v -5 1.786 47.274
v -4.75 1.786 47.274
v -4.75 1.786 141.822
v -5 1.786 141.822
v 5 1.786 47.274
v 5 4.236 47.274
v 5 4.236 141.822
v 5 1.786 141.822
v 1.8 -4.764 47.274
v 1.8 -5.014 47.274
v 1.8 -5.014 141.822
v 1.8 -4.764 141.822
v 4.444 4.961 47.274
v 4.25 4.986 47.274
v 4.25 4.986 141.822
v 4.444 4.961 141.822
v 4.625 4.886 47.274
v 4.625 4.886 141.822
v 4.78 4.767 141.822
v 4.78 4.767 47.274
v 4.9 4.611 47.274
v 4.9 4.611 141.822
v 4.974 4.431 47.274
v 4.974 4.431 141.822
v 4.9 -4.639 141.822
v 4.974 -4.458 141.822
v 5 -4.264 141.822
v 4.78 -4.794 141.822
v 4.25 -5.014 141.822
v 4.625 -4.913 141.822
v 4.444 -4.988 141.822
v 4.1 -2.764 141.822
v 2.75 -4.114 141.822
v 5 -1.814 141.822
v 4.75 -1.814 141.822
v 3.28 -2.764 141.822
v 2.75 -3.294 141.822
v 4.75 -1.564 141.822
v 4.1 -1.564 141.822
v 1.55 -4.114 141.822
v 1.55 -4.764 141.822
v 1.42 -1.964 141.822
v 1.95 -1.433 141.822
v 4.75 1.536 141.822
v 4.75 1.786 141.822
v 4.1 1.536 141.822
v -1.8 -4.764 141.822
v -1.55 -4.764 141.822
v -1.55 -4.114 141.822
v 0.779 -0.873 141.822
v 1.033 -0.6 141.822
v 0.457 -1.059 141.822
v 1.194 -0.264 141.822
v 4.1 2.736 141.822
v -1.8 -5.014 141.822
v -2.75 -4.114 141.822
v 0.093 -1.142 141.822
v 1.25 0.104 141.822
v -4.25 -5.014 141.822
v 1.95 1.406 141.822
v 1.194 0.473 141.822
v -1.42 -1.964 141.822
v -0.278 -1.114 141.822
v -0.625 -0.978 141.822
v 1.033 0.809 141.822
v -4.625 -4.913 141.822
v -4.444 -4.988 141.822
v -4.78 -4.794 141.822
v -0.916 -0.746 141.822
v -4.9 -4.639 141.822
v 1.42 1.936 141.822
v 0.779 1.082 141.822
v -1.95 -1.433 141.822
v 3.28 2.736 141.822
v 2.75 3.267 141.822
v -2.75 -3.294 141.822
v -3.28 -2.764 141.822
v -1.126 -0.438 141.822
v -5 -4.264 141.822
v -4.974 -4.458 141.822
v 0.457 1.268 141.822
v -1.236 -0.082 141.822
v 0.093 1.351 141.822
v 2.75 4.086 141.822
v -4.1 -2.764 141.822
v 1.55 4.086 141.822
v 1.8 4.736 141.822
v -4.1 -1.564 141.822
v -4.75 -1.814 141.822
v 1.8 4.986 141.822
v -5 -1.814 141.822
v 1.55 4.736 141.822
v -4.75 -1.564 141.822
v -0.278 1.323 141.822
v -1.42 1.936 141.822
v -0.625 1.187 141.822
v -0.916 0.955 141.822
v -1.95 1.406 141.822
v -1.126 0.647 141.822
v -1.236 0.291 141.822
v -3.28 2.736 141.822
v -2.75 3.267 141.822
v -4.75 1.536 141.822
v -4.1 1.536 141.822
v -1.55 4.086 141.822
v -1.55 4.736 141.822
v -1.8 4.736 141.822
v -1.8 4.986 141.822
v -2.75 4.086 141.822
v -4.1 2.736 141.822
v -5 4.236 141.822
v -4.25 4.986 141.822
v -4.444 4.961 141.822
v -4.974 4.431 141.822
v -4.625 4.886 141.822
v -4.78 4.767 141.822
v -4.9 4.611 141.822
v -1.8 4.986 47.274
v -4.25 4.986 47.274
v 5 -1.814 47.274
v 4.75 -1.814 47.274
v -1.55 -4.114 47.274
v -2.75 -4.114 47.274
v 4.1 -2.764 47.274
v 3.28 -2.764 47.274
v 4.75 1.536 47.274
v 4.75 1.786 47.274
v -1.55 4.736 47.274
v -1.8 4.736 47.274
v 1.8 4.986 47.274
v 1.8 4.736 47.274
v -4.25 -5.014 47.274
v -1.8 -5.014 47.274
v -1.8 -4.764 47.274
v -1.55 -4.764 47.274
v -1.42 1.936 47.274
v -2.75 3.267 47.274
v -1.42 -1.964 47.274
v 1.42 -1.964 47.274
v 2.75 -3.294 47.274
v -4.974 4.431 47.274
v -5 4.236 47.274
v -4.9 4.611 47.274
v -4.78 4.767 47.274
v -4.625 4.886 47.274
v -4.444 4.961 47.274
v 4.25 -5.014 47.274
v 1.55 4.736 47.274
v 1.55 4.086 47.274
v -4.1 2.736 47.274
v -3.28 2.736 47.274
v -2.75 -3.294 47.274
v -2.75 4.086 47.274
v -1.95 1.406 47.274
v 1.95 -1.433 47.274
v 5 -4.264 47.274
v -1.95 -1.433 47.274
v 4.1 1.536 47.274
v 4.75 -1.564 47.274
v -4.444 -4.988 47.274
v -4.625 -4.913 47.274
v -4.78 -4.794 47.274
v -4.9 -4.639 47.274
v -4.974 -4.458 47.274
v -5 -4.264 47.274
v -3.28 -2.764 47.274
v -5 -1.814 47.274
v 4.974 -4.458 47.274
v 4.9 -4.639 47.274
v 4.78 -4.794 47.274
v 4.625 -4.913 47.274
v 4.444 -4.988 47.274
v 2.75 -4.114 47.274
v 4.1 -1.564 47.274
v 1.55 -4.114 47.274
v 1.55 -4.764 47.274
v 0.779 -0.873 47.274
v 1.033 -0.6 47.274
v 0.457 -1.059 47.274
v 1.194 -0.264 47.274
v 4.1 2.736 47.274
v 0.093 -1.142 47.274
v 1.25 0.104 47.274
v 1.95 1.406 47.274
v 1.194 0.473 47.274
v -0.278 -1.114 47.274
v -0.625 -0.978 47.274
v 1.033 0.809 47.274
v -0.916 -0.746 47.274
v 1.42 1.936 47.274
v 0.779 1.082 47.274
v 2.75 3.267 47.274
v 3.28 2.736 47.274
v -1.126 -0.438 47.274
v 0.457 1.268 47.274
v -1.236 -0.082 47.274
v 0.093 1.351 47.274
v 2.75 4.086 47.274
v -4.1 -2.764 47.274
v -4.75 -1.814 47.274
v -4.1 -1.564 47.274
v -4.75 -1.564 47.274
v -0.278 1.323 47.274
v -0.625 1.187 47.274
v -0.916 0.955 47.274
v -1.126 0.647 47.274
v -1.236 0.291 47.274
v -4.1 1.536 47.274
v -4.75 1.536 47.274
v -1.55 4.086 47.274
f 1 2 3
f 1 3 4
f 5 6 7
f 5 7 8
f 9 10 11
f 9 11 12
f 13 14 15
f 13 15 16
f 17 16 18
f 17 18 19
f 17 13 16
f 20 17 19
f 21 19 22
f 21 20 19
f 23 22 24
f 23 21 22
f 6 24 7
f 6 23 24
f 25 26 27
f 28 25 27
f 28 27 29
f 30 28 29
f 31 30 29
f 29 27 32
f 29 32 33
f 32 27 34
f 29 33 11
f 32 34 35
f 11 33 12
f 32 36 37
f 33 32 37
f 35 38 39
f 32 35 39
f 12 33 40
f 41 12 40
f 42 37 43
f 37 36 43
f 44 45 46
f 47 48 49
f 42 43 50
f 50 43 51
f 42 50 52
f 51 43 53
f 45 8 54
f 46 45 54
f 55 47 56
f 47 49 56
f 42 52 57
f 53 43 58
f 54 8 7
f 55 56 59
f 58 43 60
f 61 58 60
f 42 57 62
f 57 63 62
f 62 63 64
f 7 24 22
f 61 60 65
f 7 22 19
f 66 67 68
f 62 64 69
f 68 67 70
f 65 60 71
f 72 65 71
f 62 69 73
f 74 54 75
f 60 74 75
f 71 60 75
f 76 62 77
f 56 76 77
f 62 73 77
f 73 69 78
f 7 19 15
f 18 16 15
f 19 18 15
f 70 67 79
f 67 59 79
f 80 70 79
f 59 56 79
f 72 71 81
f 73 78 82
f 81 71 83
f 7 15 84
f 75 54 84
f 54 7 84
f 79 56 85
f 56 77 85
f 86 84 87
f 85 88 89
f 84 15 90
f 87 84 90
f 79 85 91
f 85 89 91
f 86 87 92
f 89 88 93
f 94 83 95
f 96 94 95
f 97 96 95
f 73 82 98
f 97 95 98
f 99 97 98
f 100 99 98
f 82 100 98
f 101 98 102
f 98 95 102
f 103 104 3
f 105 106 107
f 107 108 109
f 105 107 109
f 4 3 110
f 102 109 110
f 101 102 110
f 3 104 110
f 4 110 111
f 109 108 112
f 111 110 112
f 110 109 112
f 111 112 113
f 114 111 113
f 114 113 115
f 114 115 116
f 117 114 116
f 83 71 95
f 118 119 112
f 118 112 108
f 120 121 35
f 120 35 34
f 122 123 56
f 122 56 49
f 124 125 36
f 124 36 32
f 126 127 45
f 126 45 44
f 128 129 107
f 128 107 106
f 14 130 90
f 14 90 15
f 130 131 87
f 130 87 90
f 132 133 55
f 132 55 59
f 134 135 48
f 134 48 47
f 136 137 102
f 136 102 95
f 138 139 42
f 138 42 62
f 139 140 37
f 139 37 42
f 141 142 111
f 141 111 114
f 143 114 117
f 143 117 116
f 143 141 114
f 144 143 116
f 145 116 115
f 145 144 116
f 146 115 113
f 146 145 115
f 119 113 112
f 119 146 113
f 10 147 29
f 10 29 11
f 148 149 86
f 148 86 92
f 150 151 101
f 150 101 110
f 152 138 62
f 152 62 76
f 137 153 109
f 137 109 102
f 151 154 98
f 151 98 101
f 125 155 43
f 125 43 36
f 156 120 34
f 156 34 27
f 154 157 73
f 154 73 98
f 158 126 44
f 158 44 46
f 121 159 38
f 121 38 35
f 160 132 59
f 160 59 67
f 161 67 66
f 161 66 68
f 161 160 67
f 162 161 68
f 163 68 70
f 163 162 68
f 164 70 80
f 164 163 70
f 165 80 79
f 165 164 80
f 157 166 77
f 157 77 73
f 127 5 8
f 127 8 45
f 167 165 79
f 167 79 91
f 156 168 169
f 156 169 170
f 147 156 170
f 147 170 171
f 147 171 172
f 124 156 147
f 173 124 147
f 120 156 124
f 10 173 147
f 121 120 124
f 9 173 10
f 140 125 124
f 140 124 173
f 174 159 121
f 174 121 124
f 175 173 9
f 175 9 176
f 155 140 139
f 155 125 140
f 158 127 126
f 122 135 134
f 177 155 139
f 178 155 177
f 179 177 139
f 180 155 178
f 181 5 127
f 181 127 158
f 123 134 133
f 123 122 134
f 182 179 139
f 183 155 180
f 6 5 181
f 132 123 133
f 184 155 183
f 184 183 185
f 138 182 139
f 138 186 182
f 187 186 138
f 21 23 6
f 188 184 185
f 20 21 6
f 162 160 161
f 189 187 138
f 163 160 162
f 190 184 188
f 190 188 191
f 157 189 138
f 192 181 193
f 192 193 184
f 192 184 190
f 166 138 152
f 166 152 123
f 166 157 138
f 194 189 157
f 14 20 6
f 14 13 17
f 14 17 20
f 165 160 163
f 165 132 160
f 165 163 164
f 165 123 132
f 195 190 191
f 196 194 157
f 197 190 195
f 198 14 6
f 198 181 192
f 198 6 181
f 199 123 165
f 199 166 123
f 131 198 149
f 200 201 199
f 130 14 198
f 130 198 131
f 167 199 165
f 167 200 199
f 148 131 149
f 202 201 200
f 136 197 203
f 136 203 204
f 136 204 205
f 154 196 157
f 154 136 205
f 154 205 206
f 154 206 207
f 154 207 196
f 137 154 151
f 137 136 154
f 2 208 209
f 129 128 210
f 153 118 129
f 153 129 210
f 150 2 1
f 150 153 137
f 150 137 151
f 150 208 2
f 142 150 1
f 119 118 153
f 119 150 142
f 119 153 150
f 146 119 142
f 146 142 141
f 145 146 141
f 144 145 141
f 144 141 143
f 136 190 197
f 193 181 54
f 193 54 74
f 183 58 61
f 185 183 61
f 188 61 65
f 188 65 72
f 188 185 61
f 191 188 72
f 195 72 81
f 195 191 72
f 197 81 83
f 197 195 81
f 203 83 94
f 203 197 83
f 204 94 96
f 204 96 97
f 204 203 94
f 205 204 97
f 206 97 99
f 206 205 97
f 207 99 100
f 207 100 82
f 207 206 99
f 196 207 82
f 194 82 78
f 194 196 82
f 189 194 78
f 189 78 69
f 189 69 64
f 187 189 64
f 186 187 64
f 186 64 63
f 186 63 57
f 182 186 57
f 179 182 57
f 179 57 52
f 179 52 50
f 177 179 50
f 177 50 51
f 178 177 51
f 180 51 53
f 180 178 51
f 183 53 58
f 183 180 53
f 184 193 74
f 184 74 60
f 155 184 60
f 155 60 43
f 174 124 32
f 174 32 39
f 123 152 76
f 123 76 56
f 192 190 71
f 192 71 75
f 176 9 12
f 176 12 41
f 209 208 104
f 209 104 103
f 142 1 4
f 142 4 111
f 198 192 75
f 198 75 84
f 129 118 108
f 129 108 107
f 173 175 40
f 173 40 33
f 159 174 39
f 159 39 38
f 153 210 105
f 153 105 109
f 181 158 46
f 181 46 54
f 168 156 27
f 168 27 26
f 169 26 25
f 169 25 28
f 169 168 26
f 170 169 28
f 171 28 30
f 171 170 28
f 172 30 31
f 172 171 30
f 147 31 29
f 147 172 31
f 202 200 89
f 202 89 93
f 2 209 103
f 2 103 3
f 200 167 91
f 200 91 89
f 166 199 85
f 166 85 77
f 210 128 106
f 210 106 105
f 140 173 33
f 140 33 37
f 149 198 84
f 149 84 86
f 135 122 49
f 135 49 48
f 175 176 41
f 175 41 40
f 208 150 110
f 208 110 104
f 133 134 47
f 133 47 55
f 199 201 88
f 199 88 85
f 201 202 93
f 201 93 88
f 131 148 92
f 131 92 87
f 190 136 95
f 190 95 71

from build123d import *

# Parameters (mm, degrees)
SKETCH1_R           = 2.5
BOSS_EXTRUDE1_DEPTH = 189.096108091
SCALE_2_SCALE       = 3
SCALE_3_SCALE       = 6
SCALE_5_SCALE       = 2
SCALE_6_SCALE       = 0.25
SCALE_7_SCALE       = 0.125
SCALE_8_SCALE       = 0.25
SCALE_9_SCALE       = 4
SCALE_10_SCALE      = 4
SCALE_11_SCALE      = 0.111111111


with BuildPart() as part:
    # Sketch1 → Boss-Extrude1 (new body)
    with BuildSketch(Plane.XY):
        with BuildLine():
            Line((2.839339828, 3.9), (5.5, 6.560660172))
            Line((5.5, 6.560660172), (5.5, 8.2))
            Line((5.5, 8.2), (3.1, 8.2))
            Line((3.1, 8.2), (3.1, 9.5))
            Line((3.1, 9.5), (3.6, 9.5))
            Line((3.6, 9.5), (3.6, 10))
            Line((3.6, 10), (8.5, 10))
            ThreePointArc((8.5, 10), (9.560660172, 9.560660172), (10, 8.5))
            Line((10, 8.5), (10, 3.6))
            Line((10, 3.6), (9.5, 3.6))
            Line((9.5, 3.6), (9.5, 3.1))
            Line((9.5, 3.1), (8.2, 3.1))
            Line((8.2, 3.1), (8.2, 5.5))
            Line((8.2, 5.5), (6.560660172, 5.5))
            Line((6.560660172, 5.5), (3.9, 2.839339828))
            Line((3.9, 2.839339828), (3.9, -2.839339828))
            Line((3.9, -2.839339828), (6.560660172, -5.5))
            Line((6.560660172, -5.5), (8.2, -5.5))
            Line((8.2, -5.5), (8.2, -3.1))
            Line((8.2, -3.1), (9.5, -3.1))
            Line((9.5, -3.1), (9.5, -3.6))
            Line((9.5, -3.6), (10, -3.6))
            Line((10, -3.6), (10, -8.5))
            ThreePointArc((10, -8.5), (9.560660172, -9.560660172), (8.5, -10))
            Line((8.5, -10), (3.6, -10))
            Line((3.6, -10), (3.6, -9.5))
            Line((3.6, -9.5), (3.1, -9.5))
            Line((3.1, -9.5), (3.1, -8.2))
            Line((3.1, -8.2), (5.5, -8.2))
            Line((5.5, -8.2), (5.5, -6.560660172))
            Line((5.5, -6.560660172), (2.839339828, -3.9))
            Line((2.839339828, -3.9), (-2.839339828, -3.9))
            Line((-2.839339828, -3.9), (-5.5, -6.560660172))
            Line((-5.5, -6.560660172), (-5.5, -8.2))
            Line((-5.5, -8.2), (-3.1, -8.2))
            Line((-3.1, -8.2), (-3.1, -9.5))
            Line((-3.1, -9.5), (-3.6, -9.5))
            Line((-3.6, -9.5), (-3.6, -10))
            Line((-3.6, -10), (-8.5, -10))
            ThreePointArc((-8.5, -10), (-9.560660172, -9.560660172), (-10, -8.5))
            Line((-10, -8.5), (-10, -3.6))
            Line((-10, -3.6), (-9.5, -3.6))
            Line((-9.5, -3.6), (-9.5, -3.1))
            Line((-9.5, -3.1), (-8.2, -3.1))
            Line((-8.2, -3.1), (-8.2, -5.5))
            Line((-8.2, -5.5), (-6.560660172, -5.5))
            Line((-6.560660172, -5.5), (-3.9, -2.839339828))
            Line((-3.9, -2.839339828), (-3.9, 2.839339828))
            Line((-3.9, 2.839339828), (-6.560660172, 5.5))
            Line((-6.560660172, 5.5), (-8.2, 5.5))
            Line((-8.2, 5.5), (-8.2, 3.1))
            Line((-8.2, 3.1), (-9.5, 3.1))
            Line((-9.5, 3.1), (-9.5, 3.6))
            Line((-9.5, 3.6), (-10, 3.6))
            Line((-10, 3.6), (-10, 8.5))
            ThreePointArc((-10, 8.5), (-9.560660172, 9.560660172), (-8.5, 10))
            Line((-8.5, 10), (-3.6, 10))
            Line((-3.6, 10), (-3.6, 9.5))
            Line((-3.6, 9.5), (-3.1, 9.5))
            Line((-3.1, 9.5), (-3.1, 8.2))
            Line((-3.1, 8.2), (-5.5, 8.2))
            Line((-5.5, 8.2), (-5.5, 6.560660172))
            Line((-5.5, 6.560660172), (-2.839339828, 3.9))
            Line((-2.839339828, 3.9), (2.839339828, 3.9))
        make_face()
        with Locations((0, 0.235847297)):
            Circle(SKETCH1_R, mode=Mode.SUBTRACT)
    extrude(amount=BOSS_EXTRUDE1_DEPTH)


with BuildPart() as part_1:
    # 缩放比例2: scaled about (0, -0.027095247, 94.548054046)
    add(part.part.scale(SCALE_2_SCALE).moved(Location((0, 0.054190494, -189.096108092))))


with BuildPart() as part_2:
    # 缩放比例3: scaled about (0, -0.027095247, 94.548054045)
    add(part_1.part.scale(SCALE_3_SCALE).moved(Location((0, 0.135476235, -472.740270225))))


with BuildPart() as part_3:
    # 缩放比例5: scaled about (0, -0.027095249, 94.548054043)
    add(part_2.part.scale(SCALE_5_SCALE).moved(Location((0, 0.027095249, -94.548054043))))


with BuildPart() as part_4:
    # 缩放比例6: scaled about (0, -0.027095249, 94.548054044)
    add(part_3.part.scale(SCALE_6_SCALE).moved(Location((0, -0.020321437, 70.911040533))))


with BuildPart() as part_5:
    # 缩放比例7: scaled about (0, -0.027095249, 94.548054044)
    add(part_4.part.scale(SCALE_7_SCALE).moved(Location((0, -0.023708343, 82.729547289))))


with BuildPart() as part_6:
    # 缩放比例8: scaled about (0, -0.027095249, 94.548054044)
    add(part_5.part.scale(SCALE_8_SCALE).moved(Location((0, -0.020321437, 70.911040533))))


with BuildPart() as part_7:
    # 缩放比例9: scaled about (0, -0.027095249, 94.548054044)
    add(part_6.part.scale(SCALE_9_SCALE).moved(Location((0, 0.081285747, -283.644162132))))


with BuildPart() as part_8:
    # 缩放比例10: scaled about (0, -0.027095249, 94.548054044)
    add(part_7.part.scale(SCALE_10_SCALE).moved(Location((0, 0.081285747, -283.644162132))))


with BuildPart() as part_9:
    # 缩放比例11: scaled about (0, -0.027095249, 94.548054044)
    add(part_8.part.scale(SCALE_11_SCALE).moved(Location((0, -0.024084666, 84.042714706))))


solid = part_9.part
